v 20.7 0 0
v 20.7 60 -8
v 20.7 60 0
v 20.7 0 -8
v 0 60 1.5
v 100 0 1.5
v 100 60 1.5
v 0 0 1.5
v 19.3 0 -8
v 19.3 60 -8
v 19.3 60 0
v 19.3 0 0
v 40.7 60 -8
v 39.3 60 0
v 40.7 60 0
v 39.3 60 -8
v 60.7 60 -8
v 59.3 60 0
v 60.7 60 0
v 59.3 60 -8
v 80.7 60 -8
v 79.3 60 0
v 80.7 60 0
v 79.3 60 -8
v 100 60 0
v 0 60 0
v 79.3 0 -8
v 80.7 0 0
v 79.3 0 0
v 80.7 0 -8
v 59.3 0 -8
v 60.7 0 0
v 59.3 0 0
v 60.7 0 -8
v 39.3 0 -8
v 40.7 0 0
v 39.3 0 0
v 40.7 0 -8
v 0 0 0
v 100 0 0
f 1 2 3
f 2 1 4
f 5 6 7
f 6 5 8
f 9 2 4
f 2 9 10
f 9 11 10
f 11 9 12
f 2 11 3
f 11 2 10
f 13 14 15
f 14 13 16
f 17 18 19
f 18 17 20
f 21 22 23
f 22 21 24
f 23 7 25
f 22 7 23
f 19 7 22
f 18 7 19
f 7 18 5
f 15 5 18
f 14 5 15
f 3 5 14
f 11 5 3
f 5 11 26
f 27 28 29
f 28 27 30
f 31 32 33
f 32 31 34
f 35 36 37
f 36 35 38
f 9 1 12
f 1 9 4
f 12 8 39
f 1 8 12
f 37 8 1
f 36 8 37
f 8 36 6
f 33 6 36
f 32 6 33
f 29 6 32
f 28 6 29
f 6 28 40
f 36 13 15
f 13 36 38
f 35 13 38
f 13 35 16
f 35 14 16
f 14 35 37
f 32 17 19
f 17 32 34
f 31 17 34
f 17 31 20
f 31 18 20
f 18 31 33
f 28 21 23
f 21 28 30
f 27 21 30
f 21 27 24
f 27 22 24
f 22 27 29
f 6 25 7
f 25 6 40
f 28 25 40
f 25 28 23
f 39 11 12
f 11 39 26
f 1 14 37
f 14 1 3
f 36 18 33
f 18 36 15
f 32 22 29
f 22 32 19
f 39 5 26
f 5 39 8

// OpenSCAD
$fn = 32;

// ----------------------------------------------------------------------
// Ribbed panel: 1.5 mm panel
// ----------------------------------------------------------------------

// --- parameters (mm) ---
panel_l = 100;            // panel length, X
panel_w = 60;             // panel width, Y
panel_t = 1.5;            // panel thickness, Z
rib_t = 1.4;              // rib thickness
rib_h = 8;                // rib height below the panel
ribs = 4;                 // number of ribs

total_h = panel_t + rib_h;  // overall height

union() {
  cube([panel_l, panel_w, panel_t]);
  for (i = [1 : ribs])
    translate([i * panel_l / (ribs + 1) - rib_t / 2, 0, -rib_h])
      cube([rib_t, panel_w, rib_h + panel_t]);
}
